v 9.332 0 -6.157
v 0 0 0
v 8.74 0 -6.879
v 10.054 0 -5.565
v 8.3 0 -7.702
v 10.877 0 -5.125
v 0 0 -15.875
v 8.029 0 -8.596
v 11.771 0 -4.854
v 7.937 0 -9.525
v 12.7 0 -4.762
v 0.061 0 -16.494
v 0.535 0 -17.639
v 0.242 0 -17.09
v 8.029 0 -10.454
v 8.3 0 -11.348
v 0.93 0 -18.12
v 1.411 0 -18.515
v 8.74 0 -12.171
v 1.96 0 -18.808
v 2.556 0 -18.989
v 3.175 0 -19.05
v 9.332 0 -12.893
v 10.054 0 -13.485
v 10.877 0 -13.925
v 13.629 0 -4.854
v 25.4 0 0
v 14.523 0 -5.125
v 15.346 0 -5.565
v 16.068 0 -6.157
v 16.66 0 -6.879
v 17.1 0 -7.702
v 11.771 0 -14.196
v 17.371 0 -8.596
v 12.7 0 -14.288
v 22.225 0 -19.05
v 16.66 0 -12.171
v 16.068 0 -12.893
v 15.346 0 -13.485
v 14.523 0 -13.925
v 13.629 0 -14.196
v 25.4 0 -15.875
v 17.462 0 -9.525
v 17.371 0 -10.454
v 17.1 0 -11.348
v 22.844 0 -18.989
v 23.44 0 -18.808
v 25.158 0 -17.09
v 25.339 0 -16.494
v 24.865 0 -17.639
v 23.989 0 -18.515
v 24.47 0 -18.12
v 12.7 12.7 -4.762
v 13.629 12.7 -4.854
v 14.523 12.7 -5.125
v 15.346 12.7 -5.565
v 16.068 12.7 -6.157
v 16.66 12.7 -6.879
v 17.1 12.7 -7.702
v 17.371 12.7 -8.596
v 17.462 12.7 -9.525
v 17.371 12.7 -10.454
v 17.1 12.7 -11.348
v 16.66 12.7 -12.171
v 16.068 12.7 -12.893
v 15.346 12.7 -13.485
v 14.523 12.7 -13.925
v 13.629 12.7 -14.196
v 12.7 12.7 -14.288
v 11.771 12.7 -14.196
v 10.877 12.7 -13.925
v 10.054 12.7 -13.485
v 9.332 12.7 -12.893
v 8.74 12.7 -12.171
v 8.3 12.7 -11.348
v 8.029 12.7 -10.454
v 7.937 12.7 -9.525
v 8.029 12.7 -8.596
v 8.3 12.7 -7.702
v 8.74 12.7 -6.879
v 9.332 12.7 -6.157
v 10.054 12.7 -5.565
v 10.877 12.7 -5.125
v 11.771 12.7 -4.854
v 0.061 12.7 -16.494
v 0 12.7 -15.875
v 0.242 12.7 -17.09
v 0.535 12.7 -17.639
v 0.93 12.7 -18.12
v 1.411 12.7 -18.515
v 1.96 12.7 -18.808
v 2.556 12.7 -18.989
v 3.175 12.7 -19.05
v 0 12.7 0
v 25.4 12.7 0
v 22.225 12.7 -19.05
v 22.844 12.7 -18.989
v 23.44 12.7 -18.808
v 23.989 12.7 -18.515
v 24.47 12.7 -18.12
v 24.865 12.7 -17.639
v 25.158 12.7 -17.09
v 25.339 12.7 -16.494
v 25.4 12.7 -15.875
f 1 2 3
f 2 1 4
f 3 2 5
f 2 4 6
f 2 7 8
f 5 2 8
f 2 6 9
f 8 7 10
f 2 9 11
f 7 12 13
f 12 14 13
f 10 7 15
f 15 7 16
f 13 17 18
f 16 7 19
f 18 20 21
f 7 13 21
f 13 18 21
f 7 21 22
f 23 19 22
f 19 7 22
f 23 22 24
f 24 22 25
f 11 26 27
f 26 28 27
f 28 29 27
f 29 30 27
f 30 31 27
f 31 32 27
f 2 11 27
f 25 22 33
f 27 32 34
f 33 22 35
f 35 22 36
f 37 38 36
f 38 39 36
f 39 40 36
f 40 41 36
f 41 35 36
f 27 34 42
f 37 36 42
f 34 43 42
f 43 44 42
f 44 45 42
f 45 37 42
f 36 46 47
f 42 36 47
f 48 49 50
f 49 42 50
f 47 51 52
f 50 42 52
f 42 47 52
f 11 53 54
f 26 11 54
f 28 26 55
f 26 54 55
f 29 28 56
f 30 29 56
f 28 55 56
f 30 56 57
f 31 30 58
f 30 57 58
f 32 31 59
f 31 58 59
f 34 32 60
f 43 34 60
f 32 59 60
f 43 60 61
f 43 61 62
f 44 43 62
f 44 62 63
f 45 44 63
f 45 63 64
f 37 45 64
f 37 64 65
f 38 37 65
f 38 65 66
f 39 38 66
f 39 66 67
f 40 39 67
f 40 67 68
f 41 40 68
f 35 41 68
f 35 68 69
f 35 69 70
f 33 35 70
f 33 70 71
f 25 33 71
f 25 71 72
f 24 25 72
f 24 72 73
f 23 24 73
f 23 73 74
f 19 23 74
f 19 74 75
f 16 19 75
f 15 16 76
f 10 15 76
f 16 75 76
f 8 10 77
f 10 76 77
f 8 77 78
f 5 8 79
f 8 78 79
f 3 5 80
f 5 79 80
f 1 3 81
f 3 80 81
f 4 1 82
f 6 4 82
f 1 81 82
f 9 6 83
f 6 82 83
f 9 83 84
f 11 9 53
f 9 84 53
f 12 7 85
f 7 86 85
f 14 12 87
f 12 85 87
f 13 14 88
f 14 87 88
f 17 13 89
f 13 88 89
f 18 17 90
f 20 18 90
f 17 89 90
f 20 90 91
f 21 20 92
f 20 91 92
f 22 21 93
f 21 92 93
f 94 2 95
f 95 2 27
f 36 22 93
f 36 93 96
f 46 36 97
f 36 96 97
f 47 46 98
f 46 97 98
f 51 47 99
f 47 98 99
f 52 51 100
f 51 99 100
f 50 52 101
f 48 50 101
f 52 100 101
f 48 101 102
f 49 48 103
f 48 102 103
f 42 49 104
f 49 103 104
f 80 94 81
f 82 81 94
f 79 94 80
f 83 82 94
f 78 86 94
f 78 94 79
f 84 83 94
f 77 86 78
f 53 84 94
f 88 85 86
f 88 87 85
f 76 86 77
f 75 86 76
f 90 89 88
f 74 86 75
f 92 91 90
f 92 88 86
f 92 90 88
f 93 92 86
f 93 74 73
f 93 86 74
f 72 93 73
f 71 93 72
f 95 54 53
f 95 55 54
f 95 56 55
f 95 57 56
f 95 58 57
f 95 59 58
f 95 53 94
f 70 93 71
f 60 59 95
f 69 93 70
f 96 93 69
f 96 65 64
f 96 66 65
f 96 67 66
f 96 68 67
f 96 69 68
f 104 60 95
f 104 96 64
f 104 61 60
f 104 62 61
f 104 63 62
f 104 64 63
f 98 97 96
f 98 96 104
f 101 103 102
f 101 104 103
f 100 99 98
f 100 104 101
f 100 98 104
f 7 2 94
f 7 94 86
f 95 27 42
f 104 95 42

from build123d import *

# Parameters (mm, degrees)
SKETCH1_W           = 25.4
SKETCH1_H           = 19.05
BOSS_EXTRUDE1_DEPTH = 12.7
SKETCH2_R           = 4.7625
CUT_EXTRUDE1_DEPTH  = 35.195796525
FILLET1_R           = 3.175


with BuildPart() as part:
    # Sketch1 → Boss-Extrude1 (new body)
    with BuildSketch(Plane(origin=(0, 0, 0), x_dir=(1, 0, 0), z_dir=(0, 1, 0))):
        with Locations((12.7, 9.525)):
            Rectangle(SKETCH1_W, SKETCH1_H)
    extrude(amount=BOSS_EXTRUDE1_DEPTH)

    # Sketch2 → Cut-Extrude1 (cut, through all)
    with BuildSketch(Plane(origin=(0, 12.7, 0), x_dir=(1, 0, 0), z_dir=(0, 1, 0))):
        with Locations(Location((12.7, 9.525, 0), (0, 0, 270))):
            Circle(SKETCH2_R)
    extrude(amount=-CUT_EXTRUDE1_DEPTH, mode=Mode.SUBTRACT)

    # Fillet1
    fillet1_edges = [part.edges().sort_by_distance(p)[0] for p in [
        (0, 6.35, -19.05),
        (25.4, 6.35, -19.05),
    ]]
    fillet(fillet1_edges, radius=FILLET1_R)


solid = part.part
